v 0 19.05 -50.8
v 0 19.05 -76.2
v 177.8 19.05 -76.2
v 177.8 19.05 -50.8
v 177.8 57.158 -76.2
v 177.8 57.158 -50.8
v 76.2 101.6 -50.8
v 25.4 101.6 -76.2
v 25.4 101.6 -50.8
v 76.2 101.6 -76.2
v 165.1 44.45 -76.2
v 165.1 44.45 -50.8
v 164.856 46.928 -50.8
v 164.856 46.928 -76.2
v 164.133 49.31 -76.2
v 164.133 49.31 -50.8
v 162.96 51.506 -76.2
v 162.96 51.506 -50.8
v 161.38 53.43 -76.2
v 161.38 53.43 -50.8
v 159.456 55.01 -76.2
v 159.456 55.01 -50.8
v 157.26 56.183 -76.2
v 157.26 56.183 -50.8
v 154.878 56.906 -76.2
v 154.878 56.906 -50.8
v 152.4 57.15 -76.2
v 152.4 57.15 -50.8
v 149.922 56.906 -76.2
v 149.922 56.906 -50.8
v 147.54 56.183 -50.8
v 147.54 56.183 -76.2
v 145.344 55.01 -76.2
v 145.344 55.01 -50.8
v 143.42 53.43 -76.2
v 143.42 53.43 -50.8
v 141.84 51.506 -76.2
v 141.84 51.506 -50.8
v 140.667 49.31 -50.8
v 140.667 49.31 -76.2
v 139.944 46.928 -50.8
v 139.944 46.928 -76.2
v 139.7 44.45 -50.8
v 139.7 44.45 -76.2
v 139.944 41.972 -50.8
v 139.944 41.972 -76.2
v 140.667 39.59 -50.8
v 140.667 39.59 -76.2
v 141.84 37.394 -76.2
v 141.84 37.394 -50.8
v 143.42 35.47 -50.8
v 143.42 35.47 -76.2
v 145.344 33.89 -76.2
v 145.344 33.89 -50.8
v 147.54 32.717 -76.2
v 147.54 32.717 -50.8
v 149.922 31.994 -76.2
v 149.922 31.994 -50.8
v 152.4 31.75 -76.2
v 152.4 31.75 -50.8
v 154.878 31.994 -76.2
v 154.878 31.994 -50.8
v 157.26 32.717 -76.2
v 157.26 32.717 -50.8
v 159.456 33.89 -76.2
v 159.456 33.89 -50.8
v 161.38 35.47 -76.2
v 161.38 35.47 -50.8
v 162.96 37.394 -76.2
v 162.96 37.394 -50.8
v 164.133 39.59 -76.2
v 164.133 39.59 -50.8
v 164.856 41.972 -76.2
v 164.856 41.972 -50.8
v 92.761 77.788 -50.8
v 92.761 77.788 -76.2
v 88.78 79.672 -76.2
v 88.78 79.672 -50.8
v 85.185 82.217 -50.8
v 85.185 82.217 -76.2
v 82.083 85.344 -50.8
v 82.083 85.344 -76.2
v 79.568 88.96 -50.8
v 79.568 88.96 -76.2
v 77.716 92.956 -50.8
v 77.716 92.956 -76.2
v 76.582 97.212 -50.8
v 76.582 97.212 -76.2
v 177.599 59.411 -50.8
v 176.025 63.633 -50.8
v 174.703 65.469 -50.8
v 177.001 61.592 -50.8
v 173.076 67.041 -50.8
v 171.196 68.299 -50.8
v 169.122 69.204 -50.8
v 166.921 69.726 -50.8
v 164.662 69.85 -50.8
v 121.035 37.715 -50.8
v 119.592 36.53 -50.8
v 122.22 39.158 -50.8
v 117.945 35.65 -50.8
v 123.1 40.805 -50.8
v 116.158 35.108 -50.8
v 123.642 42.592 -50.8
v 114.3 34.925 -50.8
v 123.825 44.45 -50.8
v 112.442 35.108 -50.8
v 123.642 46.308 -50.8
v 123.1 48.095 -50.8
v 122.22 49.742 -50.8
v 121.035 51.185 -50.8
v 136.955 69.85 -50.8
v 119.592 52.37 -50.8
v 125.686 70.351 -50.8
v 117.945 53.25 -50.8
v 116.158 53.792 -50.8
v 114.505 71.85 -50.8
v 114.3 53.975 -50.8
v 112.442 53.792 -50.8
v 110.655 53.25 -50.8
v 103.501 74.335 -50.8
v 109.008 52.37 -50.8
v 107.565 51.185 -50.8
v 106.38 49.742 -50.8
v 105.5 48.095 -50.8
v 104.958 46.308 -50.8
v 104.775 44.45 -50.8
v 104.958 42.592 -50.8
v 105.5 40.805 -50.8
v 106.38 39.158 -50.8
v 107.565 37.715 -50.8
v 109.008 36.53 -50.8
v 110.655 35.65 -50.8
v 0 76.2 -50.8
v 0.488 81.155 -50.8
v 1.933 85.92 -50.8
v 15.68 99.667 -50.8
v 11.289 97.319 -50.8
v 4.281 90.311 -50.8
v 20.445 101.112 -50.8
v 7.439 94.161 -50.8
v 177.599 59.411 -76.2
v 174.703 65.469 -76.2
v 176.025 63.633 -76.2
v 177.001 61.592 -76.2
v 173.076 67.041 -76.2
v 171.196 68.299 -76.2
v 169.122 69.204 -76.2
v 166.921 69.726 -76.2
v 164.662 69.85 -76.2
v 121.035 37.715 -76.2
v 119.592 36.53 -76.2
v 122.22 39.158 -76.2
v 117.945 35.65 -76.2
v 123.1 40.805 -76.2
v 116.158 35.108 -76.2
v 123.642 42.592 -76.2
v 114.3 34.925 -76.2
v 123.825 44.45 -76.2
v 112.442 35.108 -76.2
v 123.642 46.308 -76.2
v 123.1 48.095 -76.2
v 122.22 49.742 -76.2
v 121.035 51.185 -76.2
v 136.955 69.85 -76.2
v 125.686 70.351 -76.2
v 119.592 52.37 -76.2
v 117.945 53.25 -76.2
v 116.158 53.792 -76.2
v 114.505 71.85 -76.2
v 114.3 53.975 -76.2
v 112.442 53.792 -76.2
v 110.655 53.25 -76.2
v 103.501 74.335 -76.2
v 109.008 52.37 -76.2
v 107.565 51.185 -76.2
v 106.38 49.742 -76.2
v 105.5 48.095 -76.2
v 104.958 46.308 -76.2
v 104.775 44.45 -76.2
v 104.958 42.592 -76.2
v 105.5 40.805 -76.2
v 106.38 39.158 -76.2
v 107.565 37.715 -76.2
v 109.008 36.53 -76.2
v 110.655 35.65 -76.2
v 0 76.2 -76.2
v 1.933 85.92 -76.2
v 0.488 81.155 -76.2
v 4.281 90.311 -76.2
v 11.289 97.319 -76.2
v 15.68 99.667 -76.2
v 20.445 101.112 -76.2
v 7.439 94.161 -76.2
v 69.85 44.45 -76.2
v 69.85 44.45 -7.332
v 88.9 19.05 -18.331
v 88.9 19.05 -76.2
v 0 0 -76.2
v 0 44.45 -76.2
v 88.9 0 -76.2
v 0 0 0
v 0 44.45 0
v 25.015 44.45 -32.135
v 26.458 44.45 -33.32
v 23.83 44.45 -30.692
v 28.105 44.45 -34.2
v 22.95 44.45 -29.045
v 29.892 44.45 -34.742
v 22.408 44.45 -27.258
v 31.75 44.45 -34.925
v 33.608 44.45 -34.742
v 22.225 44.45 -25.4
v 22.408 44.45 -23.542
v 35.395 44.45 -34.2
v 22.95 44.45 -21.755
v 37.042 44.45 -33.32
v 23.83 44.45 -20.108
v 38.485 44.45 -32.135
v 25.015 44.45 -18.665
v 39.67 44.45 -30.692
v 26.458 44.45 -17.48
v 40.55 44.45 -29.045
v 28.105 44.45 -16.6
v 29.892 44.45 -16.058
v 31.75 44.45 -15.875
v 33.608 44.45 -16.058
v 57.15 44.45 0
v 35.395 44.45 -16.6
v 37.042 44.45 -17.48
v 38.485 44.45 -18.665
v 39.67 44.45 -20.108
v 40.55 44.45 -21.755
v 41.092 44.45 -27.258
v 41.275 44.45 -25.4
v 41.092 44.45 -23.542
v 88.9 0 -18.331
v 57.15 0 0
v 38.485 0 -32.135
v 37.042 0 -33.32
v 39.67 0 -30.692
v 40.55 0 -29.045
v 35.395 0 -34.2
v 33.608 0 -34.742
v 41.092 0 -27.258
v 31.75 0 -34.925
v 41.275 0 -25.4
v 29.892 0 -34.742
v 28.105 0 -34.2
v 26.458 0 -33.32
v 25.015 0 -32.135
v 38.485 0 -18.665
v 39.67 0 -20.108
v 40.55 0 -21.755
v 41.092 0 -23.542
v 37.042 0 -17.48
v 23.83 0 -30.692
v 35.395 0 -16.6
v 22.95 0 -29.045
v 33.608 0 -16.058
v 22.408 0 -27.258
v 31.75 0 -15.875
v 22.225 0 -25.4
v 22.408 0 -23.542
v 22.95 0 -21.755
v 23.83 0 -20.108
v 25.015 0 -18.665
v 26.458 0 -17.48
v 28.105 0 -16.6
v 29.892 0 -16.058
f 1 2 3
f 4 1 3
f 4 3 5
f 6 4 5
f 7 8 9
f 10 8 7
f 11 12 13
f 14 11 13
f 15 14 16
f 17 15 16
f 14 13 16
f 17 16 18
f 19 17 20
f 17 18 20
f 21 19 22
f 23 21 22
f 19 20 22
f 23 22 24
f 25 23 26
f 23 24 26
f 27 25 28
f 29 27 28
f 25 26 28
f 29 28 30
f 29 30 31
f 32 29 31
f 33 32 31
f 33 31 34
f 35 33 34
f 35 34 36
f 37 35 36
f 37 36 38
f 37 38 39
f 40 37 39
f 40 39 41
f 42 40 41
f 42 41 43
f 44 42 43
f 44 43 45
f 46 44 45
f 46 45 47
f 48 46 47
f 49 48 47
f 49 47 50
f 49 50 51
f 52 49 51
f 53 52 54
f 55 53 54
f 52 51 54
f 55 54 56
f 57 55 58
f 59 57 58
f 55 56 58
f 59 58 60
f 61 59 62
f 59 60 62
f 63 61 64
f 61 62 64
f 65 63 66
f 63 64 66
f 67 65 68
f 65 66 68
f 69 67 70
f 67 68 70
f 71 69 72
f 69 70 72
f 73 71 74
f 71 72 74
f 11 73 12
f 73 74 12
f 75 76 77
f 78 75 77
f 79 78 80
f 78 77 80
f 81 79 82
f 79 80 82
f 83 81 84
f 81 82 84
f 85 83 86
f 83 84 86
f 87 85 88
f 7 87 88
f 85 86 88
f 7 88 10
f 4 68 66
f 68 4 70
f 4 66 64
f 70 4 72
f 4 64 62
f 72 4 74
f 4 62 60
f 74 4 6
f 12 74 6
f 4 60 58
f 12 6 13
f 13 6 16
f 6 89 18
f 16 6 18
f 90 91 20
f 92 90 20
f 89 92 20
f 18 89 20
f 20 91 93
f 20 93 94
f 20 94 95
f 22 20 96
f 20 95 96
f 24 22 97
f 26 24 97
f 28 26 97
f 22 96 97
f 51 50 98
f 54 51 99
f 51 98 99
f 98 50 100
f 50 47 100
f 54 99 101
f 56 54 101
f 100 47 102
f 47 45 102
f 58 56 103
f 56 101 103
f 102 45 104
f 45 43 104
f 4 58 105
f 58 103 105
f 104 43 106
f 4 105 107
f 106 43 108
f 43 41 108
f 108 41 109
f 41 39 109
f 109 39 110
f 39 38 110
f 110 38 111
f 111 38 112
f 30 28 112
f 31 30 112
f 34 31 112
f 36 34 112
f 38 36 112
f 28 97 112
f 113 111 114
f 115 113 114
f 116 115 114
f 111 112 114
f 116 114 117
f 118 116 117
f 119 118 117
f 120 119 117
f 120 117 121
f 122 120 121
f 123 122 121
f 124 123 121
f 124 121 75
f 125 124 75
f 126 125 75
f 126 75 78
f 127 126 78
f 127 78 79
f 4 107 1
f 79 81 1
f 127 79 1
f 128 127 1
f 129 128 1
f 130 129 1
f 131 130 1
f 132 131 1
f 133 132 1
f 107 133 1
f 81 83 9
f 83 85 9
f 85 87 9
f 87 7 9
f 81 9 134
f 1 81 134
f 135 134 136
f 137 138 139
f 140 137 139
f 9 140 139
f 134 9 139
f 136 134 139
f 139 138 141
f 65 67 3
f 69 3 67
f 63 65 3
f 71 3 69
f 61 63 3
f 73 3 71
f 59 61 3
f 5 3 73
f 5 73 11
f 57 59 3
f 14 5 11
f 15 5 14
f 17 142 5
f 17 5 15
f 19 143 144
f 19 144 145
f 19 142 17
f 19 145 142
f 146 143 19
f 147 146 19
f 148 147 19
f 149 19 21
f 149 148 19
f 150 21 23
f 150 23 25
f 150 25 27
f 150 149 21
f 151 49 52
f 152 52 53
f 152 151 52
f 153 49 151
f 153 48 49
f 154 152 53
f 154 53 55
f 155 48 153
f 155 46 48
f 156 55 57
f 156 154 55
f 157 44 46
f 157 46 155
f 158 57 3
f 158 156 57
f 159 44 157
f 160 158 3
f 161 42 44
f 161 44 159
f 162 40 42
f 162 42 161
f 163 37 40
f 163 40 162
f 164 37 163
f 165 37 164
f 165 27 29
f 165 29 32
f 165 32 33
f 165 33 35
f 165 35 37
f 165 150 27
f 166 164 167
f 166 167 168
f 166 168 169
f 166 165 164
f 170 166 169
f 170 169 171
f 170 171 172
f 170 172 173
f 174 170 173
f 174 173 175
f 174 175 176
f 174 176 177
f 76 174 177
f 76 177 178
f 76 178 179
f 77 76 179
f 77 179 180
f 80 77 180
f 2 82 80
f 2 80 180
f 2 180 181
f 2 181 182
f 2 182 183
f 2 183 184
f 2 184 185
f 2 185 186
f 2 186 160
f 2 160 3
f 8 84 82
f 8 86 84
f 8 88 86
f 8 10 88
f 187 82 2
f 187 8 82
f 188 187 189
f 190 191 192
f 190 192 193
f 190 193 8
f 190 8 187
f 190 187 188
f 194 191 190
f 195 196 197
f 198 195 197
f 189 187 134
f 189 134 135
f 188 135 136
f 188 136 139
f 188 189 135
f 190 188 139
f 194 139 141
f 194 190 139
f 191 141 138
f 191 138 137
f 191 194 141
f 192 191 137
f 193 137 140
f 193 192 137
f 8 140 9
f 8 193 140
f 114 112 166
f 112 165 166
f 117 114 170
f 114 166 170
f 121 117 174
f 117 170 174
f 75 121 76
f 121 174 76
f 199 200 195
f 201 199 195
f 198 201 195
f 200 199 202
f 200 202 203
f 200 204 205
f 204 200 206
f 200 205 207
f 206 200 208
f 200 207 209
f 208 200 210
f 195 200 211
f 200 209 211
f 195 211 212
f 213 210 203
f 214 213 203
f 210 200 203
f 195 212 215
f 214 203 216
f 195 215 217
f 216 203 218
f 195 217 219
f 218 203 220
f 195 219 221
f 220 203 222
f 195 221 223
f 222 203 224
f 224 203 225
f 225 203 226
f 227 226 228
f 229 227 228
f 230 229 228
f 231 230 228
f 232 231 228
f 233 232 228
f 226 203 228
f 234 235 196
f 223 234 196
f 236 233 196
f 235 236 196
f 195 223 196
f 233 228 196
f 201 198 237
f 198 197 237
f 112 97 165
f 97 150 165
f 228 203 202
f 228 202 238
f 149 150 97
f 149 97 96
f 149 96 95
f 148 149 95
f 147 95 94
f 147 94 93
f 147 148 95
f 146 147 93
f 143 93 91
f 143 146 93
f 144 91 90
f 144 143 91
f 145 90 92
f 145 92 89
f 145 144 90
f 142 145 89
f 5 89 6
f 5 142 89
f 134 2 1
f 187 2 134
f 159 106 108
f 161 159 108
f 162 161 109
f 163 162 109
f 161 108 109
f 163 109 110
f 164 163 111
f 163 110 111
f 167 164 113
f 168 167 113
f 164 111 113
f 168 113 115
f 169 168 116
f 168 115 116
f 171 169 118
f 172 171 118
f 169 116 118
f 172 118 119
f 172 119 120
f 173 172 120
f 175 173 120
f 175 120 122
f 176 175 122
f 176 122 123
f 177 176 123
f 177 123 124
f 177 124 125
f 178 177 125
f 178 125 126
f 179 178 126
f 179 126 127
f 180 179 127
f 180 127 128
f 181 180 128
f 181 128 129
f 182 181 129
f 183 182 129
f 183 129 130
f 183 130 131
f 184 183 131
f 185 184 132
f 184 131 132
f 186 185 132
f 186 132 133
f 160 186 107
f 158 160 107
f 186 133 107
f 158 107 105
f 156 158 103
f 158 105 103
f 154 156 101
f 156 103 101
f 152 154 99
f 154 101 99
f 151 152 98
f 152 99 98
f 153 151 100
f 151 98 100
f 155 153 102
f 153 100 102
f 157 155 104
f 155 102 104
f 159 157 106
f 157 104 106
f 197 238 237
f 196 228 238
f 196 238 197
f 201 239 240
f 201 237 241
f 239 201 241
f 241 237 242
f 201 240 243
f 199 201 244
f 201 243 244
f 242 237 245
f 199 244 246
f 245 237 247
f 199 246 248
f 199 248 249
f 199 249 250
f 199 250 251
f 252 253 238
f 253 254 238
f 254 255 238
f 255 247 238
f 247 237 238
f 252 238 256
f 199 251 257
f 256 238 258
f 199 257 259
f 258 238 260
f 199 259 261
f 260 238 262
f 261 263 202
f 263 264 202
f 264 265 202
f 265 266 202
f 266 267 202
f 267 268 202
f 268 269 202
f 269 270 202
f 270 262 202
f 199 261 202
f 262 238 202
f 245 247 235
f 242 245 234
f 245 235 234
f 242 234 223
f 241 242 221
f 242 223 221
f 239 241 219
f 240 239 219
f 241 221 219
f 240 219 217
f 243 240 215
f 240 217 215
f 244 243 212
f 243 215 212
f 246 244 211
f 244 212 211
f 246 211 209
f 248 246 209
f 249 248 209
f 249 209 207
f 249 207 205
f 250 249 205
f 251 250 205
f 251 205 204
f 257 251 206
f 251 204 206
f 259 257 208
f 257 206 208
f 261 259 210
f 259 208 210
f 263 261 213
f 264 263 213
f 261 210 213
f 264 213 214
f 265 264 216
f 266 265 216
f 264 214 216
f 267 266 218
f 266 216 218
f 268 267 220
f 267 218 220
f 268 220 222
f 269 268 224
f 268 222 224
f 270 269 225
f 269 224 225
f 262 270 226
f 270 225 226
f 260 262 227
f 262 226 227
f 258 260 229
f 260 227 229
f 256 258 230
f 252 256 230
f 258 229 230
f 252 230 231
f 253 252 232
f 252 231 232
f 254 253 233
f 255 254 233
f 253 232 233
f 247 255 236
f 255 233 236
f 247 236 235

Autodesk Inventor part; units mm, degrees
ref_plane "YZ Plane" through (0, 0, 0) normal (1, 0, 0) x (0, 1, 0)
ref_plane "XZ Plane" through (0, 0, 0) normal (0, 1, 0) x (-1, 0, 0)
ref_plane "XY Plane" through (0, 0, 0) normal (0, 0, 1) x (1, 0, 0)
sketch "Sketch1" plane through (0, 0, 0) normal (0, 0, 1) x (1, 0, 0)
  line L0 (0, 0) -> (0, 44.45)
  line L1 (0, 44.45) -> (69.85, 44.45)
  line L2 (69.85, 44.45) -> (88.9, 19.05)
  line L3 (88.9, 19.05) -> (88.9, 0)
  line L4 (88.9, 0) -> (0, 0)
  dimension "d0" = 44.45
  dimension "d1" = 69.85
  dimension "d2" = 88.9
  dimension "d3" = 19.05
extrude "Extrusion1" add sketch "Sketch1" against normal blind 76.2
sketch "Sketch2" plane through (0, 0, -76.2) normal (0, 0, -1) x (-1, 0, 0)
  line L0 (0, 0) -> (0, 19.05)
  line L1 (0, 0) -> (0, 44.45) projected
  line L2 (0, 19.05) -> (0, 76.2)
  line L3 (-25.4, 101.6) -> (-76.2, 101.6)
  line L4 (0, 19.05) -> (-177.8, 19.05)
  line L5 (-177.8, 19.05) -> (-177.8, 57.1575)
  arc A0 (-164.6625, 69.85) -> (-177.8, 57.1575) centre (-165.1, 57.1575) ccw
  arc A1 (0, 76.2) -> (-25.4, 101.6) centre (-25.4, 76.2) ccw
  line L6 (-164.6625, 69.85) -> (-136.9553, 69.85)
  arc A2 (-136.9553, 69.85) -> (-92.7612, 77.7875) centre (-136.9553, 196.85) ccw
  arc A3 (-92.7612, 77.7875) -> (-76.2, 101.6) centre (-101.6, 101.6) ccw
  point P0 (0, 101.6)
  dimension "d6" = 19.05
  dimension "d7" = 177.8
  dimension "d9" = 82.55
  dimension "d10" = 12.7
  dimension "d11" = 25.4
  dimension "d13" = 31.75
  dimension "d14" = 101.6
  dimension "d36" = 127
  dimension "d37" = 25.4
extrude "Extrusion2" add sketch "Sketch2" against normal blind 25.4 separate body
sketch "Sketch3" plane through (0, 44.45, 0) normal (0, 1, 0) x (1, 0, 0)
  line L0 (0, 0) -> (57.15, 0)
  line L1 (0, 0) -> (69.85, 0) projected
  line L2 (57.15, 0) -> (106.8424, 28.6899)
  line L3 (106.8424, 28.6899) -> (106.8424, 0)
  line L4 (106.8424, 0) -> (57.15, 0)
  dimension "d18" = 57.15
  dimension "d19" = 30
extrude "Extrusion3" cut sketch "Sketch3" against normal through all bodies 1
sketch "Sketch4" plane through (0, 44.45, -76.2) normal (0, 1, 0) x (1, 0, 0)
  circle A0 centre (31.75, -50.8) radius 9.525
  line L0 (57.15, -76.2) -> (0, -76.2) projected
  line L1 (0, -76.2) -> (0, 0) projected
  dimension "d22" = 19.05
  dimension "d23" = 25.4
  dimension "d24" = 31.75
extrude "Extrusion4" cut sketch "Sketch4" against normal through all bodies 1
sketch "Sketch5" plane through (0, 0, -50.8) normal (0, 0, 1) x (1, 0, 0)
  circle A0 centre (152.4, 44.45) radius 12.7
  circle A1 centre (114.3, 44.45) radius 9.525
  line L0 (0, 19.05) -> (177.8, 19.05) projected
  line L1 (177.8, 19.05) -> (177.8, 57.1575) projected
  point P0 (0, 0)
  dimension "d27" = 25.4
  dimension "d28" = 19.05
  dimension "d29" = 25.4
  dimension "d30" = 38.1
  dimension "d32" = 25.4
  dimension "d33" = 0
extrude "Extrusion5" cut sketch "Sketch5" against normal through all bodies 2
properties part number "HW 8 Part 3"
